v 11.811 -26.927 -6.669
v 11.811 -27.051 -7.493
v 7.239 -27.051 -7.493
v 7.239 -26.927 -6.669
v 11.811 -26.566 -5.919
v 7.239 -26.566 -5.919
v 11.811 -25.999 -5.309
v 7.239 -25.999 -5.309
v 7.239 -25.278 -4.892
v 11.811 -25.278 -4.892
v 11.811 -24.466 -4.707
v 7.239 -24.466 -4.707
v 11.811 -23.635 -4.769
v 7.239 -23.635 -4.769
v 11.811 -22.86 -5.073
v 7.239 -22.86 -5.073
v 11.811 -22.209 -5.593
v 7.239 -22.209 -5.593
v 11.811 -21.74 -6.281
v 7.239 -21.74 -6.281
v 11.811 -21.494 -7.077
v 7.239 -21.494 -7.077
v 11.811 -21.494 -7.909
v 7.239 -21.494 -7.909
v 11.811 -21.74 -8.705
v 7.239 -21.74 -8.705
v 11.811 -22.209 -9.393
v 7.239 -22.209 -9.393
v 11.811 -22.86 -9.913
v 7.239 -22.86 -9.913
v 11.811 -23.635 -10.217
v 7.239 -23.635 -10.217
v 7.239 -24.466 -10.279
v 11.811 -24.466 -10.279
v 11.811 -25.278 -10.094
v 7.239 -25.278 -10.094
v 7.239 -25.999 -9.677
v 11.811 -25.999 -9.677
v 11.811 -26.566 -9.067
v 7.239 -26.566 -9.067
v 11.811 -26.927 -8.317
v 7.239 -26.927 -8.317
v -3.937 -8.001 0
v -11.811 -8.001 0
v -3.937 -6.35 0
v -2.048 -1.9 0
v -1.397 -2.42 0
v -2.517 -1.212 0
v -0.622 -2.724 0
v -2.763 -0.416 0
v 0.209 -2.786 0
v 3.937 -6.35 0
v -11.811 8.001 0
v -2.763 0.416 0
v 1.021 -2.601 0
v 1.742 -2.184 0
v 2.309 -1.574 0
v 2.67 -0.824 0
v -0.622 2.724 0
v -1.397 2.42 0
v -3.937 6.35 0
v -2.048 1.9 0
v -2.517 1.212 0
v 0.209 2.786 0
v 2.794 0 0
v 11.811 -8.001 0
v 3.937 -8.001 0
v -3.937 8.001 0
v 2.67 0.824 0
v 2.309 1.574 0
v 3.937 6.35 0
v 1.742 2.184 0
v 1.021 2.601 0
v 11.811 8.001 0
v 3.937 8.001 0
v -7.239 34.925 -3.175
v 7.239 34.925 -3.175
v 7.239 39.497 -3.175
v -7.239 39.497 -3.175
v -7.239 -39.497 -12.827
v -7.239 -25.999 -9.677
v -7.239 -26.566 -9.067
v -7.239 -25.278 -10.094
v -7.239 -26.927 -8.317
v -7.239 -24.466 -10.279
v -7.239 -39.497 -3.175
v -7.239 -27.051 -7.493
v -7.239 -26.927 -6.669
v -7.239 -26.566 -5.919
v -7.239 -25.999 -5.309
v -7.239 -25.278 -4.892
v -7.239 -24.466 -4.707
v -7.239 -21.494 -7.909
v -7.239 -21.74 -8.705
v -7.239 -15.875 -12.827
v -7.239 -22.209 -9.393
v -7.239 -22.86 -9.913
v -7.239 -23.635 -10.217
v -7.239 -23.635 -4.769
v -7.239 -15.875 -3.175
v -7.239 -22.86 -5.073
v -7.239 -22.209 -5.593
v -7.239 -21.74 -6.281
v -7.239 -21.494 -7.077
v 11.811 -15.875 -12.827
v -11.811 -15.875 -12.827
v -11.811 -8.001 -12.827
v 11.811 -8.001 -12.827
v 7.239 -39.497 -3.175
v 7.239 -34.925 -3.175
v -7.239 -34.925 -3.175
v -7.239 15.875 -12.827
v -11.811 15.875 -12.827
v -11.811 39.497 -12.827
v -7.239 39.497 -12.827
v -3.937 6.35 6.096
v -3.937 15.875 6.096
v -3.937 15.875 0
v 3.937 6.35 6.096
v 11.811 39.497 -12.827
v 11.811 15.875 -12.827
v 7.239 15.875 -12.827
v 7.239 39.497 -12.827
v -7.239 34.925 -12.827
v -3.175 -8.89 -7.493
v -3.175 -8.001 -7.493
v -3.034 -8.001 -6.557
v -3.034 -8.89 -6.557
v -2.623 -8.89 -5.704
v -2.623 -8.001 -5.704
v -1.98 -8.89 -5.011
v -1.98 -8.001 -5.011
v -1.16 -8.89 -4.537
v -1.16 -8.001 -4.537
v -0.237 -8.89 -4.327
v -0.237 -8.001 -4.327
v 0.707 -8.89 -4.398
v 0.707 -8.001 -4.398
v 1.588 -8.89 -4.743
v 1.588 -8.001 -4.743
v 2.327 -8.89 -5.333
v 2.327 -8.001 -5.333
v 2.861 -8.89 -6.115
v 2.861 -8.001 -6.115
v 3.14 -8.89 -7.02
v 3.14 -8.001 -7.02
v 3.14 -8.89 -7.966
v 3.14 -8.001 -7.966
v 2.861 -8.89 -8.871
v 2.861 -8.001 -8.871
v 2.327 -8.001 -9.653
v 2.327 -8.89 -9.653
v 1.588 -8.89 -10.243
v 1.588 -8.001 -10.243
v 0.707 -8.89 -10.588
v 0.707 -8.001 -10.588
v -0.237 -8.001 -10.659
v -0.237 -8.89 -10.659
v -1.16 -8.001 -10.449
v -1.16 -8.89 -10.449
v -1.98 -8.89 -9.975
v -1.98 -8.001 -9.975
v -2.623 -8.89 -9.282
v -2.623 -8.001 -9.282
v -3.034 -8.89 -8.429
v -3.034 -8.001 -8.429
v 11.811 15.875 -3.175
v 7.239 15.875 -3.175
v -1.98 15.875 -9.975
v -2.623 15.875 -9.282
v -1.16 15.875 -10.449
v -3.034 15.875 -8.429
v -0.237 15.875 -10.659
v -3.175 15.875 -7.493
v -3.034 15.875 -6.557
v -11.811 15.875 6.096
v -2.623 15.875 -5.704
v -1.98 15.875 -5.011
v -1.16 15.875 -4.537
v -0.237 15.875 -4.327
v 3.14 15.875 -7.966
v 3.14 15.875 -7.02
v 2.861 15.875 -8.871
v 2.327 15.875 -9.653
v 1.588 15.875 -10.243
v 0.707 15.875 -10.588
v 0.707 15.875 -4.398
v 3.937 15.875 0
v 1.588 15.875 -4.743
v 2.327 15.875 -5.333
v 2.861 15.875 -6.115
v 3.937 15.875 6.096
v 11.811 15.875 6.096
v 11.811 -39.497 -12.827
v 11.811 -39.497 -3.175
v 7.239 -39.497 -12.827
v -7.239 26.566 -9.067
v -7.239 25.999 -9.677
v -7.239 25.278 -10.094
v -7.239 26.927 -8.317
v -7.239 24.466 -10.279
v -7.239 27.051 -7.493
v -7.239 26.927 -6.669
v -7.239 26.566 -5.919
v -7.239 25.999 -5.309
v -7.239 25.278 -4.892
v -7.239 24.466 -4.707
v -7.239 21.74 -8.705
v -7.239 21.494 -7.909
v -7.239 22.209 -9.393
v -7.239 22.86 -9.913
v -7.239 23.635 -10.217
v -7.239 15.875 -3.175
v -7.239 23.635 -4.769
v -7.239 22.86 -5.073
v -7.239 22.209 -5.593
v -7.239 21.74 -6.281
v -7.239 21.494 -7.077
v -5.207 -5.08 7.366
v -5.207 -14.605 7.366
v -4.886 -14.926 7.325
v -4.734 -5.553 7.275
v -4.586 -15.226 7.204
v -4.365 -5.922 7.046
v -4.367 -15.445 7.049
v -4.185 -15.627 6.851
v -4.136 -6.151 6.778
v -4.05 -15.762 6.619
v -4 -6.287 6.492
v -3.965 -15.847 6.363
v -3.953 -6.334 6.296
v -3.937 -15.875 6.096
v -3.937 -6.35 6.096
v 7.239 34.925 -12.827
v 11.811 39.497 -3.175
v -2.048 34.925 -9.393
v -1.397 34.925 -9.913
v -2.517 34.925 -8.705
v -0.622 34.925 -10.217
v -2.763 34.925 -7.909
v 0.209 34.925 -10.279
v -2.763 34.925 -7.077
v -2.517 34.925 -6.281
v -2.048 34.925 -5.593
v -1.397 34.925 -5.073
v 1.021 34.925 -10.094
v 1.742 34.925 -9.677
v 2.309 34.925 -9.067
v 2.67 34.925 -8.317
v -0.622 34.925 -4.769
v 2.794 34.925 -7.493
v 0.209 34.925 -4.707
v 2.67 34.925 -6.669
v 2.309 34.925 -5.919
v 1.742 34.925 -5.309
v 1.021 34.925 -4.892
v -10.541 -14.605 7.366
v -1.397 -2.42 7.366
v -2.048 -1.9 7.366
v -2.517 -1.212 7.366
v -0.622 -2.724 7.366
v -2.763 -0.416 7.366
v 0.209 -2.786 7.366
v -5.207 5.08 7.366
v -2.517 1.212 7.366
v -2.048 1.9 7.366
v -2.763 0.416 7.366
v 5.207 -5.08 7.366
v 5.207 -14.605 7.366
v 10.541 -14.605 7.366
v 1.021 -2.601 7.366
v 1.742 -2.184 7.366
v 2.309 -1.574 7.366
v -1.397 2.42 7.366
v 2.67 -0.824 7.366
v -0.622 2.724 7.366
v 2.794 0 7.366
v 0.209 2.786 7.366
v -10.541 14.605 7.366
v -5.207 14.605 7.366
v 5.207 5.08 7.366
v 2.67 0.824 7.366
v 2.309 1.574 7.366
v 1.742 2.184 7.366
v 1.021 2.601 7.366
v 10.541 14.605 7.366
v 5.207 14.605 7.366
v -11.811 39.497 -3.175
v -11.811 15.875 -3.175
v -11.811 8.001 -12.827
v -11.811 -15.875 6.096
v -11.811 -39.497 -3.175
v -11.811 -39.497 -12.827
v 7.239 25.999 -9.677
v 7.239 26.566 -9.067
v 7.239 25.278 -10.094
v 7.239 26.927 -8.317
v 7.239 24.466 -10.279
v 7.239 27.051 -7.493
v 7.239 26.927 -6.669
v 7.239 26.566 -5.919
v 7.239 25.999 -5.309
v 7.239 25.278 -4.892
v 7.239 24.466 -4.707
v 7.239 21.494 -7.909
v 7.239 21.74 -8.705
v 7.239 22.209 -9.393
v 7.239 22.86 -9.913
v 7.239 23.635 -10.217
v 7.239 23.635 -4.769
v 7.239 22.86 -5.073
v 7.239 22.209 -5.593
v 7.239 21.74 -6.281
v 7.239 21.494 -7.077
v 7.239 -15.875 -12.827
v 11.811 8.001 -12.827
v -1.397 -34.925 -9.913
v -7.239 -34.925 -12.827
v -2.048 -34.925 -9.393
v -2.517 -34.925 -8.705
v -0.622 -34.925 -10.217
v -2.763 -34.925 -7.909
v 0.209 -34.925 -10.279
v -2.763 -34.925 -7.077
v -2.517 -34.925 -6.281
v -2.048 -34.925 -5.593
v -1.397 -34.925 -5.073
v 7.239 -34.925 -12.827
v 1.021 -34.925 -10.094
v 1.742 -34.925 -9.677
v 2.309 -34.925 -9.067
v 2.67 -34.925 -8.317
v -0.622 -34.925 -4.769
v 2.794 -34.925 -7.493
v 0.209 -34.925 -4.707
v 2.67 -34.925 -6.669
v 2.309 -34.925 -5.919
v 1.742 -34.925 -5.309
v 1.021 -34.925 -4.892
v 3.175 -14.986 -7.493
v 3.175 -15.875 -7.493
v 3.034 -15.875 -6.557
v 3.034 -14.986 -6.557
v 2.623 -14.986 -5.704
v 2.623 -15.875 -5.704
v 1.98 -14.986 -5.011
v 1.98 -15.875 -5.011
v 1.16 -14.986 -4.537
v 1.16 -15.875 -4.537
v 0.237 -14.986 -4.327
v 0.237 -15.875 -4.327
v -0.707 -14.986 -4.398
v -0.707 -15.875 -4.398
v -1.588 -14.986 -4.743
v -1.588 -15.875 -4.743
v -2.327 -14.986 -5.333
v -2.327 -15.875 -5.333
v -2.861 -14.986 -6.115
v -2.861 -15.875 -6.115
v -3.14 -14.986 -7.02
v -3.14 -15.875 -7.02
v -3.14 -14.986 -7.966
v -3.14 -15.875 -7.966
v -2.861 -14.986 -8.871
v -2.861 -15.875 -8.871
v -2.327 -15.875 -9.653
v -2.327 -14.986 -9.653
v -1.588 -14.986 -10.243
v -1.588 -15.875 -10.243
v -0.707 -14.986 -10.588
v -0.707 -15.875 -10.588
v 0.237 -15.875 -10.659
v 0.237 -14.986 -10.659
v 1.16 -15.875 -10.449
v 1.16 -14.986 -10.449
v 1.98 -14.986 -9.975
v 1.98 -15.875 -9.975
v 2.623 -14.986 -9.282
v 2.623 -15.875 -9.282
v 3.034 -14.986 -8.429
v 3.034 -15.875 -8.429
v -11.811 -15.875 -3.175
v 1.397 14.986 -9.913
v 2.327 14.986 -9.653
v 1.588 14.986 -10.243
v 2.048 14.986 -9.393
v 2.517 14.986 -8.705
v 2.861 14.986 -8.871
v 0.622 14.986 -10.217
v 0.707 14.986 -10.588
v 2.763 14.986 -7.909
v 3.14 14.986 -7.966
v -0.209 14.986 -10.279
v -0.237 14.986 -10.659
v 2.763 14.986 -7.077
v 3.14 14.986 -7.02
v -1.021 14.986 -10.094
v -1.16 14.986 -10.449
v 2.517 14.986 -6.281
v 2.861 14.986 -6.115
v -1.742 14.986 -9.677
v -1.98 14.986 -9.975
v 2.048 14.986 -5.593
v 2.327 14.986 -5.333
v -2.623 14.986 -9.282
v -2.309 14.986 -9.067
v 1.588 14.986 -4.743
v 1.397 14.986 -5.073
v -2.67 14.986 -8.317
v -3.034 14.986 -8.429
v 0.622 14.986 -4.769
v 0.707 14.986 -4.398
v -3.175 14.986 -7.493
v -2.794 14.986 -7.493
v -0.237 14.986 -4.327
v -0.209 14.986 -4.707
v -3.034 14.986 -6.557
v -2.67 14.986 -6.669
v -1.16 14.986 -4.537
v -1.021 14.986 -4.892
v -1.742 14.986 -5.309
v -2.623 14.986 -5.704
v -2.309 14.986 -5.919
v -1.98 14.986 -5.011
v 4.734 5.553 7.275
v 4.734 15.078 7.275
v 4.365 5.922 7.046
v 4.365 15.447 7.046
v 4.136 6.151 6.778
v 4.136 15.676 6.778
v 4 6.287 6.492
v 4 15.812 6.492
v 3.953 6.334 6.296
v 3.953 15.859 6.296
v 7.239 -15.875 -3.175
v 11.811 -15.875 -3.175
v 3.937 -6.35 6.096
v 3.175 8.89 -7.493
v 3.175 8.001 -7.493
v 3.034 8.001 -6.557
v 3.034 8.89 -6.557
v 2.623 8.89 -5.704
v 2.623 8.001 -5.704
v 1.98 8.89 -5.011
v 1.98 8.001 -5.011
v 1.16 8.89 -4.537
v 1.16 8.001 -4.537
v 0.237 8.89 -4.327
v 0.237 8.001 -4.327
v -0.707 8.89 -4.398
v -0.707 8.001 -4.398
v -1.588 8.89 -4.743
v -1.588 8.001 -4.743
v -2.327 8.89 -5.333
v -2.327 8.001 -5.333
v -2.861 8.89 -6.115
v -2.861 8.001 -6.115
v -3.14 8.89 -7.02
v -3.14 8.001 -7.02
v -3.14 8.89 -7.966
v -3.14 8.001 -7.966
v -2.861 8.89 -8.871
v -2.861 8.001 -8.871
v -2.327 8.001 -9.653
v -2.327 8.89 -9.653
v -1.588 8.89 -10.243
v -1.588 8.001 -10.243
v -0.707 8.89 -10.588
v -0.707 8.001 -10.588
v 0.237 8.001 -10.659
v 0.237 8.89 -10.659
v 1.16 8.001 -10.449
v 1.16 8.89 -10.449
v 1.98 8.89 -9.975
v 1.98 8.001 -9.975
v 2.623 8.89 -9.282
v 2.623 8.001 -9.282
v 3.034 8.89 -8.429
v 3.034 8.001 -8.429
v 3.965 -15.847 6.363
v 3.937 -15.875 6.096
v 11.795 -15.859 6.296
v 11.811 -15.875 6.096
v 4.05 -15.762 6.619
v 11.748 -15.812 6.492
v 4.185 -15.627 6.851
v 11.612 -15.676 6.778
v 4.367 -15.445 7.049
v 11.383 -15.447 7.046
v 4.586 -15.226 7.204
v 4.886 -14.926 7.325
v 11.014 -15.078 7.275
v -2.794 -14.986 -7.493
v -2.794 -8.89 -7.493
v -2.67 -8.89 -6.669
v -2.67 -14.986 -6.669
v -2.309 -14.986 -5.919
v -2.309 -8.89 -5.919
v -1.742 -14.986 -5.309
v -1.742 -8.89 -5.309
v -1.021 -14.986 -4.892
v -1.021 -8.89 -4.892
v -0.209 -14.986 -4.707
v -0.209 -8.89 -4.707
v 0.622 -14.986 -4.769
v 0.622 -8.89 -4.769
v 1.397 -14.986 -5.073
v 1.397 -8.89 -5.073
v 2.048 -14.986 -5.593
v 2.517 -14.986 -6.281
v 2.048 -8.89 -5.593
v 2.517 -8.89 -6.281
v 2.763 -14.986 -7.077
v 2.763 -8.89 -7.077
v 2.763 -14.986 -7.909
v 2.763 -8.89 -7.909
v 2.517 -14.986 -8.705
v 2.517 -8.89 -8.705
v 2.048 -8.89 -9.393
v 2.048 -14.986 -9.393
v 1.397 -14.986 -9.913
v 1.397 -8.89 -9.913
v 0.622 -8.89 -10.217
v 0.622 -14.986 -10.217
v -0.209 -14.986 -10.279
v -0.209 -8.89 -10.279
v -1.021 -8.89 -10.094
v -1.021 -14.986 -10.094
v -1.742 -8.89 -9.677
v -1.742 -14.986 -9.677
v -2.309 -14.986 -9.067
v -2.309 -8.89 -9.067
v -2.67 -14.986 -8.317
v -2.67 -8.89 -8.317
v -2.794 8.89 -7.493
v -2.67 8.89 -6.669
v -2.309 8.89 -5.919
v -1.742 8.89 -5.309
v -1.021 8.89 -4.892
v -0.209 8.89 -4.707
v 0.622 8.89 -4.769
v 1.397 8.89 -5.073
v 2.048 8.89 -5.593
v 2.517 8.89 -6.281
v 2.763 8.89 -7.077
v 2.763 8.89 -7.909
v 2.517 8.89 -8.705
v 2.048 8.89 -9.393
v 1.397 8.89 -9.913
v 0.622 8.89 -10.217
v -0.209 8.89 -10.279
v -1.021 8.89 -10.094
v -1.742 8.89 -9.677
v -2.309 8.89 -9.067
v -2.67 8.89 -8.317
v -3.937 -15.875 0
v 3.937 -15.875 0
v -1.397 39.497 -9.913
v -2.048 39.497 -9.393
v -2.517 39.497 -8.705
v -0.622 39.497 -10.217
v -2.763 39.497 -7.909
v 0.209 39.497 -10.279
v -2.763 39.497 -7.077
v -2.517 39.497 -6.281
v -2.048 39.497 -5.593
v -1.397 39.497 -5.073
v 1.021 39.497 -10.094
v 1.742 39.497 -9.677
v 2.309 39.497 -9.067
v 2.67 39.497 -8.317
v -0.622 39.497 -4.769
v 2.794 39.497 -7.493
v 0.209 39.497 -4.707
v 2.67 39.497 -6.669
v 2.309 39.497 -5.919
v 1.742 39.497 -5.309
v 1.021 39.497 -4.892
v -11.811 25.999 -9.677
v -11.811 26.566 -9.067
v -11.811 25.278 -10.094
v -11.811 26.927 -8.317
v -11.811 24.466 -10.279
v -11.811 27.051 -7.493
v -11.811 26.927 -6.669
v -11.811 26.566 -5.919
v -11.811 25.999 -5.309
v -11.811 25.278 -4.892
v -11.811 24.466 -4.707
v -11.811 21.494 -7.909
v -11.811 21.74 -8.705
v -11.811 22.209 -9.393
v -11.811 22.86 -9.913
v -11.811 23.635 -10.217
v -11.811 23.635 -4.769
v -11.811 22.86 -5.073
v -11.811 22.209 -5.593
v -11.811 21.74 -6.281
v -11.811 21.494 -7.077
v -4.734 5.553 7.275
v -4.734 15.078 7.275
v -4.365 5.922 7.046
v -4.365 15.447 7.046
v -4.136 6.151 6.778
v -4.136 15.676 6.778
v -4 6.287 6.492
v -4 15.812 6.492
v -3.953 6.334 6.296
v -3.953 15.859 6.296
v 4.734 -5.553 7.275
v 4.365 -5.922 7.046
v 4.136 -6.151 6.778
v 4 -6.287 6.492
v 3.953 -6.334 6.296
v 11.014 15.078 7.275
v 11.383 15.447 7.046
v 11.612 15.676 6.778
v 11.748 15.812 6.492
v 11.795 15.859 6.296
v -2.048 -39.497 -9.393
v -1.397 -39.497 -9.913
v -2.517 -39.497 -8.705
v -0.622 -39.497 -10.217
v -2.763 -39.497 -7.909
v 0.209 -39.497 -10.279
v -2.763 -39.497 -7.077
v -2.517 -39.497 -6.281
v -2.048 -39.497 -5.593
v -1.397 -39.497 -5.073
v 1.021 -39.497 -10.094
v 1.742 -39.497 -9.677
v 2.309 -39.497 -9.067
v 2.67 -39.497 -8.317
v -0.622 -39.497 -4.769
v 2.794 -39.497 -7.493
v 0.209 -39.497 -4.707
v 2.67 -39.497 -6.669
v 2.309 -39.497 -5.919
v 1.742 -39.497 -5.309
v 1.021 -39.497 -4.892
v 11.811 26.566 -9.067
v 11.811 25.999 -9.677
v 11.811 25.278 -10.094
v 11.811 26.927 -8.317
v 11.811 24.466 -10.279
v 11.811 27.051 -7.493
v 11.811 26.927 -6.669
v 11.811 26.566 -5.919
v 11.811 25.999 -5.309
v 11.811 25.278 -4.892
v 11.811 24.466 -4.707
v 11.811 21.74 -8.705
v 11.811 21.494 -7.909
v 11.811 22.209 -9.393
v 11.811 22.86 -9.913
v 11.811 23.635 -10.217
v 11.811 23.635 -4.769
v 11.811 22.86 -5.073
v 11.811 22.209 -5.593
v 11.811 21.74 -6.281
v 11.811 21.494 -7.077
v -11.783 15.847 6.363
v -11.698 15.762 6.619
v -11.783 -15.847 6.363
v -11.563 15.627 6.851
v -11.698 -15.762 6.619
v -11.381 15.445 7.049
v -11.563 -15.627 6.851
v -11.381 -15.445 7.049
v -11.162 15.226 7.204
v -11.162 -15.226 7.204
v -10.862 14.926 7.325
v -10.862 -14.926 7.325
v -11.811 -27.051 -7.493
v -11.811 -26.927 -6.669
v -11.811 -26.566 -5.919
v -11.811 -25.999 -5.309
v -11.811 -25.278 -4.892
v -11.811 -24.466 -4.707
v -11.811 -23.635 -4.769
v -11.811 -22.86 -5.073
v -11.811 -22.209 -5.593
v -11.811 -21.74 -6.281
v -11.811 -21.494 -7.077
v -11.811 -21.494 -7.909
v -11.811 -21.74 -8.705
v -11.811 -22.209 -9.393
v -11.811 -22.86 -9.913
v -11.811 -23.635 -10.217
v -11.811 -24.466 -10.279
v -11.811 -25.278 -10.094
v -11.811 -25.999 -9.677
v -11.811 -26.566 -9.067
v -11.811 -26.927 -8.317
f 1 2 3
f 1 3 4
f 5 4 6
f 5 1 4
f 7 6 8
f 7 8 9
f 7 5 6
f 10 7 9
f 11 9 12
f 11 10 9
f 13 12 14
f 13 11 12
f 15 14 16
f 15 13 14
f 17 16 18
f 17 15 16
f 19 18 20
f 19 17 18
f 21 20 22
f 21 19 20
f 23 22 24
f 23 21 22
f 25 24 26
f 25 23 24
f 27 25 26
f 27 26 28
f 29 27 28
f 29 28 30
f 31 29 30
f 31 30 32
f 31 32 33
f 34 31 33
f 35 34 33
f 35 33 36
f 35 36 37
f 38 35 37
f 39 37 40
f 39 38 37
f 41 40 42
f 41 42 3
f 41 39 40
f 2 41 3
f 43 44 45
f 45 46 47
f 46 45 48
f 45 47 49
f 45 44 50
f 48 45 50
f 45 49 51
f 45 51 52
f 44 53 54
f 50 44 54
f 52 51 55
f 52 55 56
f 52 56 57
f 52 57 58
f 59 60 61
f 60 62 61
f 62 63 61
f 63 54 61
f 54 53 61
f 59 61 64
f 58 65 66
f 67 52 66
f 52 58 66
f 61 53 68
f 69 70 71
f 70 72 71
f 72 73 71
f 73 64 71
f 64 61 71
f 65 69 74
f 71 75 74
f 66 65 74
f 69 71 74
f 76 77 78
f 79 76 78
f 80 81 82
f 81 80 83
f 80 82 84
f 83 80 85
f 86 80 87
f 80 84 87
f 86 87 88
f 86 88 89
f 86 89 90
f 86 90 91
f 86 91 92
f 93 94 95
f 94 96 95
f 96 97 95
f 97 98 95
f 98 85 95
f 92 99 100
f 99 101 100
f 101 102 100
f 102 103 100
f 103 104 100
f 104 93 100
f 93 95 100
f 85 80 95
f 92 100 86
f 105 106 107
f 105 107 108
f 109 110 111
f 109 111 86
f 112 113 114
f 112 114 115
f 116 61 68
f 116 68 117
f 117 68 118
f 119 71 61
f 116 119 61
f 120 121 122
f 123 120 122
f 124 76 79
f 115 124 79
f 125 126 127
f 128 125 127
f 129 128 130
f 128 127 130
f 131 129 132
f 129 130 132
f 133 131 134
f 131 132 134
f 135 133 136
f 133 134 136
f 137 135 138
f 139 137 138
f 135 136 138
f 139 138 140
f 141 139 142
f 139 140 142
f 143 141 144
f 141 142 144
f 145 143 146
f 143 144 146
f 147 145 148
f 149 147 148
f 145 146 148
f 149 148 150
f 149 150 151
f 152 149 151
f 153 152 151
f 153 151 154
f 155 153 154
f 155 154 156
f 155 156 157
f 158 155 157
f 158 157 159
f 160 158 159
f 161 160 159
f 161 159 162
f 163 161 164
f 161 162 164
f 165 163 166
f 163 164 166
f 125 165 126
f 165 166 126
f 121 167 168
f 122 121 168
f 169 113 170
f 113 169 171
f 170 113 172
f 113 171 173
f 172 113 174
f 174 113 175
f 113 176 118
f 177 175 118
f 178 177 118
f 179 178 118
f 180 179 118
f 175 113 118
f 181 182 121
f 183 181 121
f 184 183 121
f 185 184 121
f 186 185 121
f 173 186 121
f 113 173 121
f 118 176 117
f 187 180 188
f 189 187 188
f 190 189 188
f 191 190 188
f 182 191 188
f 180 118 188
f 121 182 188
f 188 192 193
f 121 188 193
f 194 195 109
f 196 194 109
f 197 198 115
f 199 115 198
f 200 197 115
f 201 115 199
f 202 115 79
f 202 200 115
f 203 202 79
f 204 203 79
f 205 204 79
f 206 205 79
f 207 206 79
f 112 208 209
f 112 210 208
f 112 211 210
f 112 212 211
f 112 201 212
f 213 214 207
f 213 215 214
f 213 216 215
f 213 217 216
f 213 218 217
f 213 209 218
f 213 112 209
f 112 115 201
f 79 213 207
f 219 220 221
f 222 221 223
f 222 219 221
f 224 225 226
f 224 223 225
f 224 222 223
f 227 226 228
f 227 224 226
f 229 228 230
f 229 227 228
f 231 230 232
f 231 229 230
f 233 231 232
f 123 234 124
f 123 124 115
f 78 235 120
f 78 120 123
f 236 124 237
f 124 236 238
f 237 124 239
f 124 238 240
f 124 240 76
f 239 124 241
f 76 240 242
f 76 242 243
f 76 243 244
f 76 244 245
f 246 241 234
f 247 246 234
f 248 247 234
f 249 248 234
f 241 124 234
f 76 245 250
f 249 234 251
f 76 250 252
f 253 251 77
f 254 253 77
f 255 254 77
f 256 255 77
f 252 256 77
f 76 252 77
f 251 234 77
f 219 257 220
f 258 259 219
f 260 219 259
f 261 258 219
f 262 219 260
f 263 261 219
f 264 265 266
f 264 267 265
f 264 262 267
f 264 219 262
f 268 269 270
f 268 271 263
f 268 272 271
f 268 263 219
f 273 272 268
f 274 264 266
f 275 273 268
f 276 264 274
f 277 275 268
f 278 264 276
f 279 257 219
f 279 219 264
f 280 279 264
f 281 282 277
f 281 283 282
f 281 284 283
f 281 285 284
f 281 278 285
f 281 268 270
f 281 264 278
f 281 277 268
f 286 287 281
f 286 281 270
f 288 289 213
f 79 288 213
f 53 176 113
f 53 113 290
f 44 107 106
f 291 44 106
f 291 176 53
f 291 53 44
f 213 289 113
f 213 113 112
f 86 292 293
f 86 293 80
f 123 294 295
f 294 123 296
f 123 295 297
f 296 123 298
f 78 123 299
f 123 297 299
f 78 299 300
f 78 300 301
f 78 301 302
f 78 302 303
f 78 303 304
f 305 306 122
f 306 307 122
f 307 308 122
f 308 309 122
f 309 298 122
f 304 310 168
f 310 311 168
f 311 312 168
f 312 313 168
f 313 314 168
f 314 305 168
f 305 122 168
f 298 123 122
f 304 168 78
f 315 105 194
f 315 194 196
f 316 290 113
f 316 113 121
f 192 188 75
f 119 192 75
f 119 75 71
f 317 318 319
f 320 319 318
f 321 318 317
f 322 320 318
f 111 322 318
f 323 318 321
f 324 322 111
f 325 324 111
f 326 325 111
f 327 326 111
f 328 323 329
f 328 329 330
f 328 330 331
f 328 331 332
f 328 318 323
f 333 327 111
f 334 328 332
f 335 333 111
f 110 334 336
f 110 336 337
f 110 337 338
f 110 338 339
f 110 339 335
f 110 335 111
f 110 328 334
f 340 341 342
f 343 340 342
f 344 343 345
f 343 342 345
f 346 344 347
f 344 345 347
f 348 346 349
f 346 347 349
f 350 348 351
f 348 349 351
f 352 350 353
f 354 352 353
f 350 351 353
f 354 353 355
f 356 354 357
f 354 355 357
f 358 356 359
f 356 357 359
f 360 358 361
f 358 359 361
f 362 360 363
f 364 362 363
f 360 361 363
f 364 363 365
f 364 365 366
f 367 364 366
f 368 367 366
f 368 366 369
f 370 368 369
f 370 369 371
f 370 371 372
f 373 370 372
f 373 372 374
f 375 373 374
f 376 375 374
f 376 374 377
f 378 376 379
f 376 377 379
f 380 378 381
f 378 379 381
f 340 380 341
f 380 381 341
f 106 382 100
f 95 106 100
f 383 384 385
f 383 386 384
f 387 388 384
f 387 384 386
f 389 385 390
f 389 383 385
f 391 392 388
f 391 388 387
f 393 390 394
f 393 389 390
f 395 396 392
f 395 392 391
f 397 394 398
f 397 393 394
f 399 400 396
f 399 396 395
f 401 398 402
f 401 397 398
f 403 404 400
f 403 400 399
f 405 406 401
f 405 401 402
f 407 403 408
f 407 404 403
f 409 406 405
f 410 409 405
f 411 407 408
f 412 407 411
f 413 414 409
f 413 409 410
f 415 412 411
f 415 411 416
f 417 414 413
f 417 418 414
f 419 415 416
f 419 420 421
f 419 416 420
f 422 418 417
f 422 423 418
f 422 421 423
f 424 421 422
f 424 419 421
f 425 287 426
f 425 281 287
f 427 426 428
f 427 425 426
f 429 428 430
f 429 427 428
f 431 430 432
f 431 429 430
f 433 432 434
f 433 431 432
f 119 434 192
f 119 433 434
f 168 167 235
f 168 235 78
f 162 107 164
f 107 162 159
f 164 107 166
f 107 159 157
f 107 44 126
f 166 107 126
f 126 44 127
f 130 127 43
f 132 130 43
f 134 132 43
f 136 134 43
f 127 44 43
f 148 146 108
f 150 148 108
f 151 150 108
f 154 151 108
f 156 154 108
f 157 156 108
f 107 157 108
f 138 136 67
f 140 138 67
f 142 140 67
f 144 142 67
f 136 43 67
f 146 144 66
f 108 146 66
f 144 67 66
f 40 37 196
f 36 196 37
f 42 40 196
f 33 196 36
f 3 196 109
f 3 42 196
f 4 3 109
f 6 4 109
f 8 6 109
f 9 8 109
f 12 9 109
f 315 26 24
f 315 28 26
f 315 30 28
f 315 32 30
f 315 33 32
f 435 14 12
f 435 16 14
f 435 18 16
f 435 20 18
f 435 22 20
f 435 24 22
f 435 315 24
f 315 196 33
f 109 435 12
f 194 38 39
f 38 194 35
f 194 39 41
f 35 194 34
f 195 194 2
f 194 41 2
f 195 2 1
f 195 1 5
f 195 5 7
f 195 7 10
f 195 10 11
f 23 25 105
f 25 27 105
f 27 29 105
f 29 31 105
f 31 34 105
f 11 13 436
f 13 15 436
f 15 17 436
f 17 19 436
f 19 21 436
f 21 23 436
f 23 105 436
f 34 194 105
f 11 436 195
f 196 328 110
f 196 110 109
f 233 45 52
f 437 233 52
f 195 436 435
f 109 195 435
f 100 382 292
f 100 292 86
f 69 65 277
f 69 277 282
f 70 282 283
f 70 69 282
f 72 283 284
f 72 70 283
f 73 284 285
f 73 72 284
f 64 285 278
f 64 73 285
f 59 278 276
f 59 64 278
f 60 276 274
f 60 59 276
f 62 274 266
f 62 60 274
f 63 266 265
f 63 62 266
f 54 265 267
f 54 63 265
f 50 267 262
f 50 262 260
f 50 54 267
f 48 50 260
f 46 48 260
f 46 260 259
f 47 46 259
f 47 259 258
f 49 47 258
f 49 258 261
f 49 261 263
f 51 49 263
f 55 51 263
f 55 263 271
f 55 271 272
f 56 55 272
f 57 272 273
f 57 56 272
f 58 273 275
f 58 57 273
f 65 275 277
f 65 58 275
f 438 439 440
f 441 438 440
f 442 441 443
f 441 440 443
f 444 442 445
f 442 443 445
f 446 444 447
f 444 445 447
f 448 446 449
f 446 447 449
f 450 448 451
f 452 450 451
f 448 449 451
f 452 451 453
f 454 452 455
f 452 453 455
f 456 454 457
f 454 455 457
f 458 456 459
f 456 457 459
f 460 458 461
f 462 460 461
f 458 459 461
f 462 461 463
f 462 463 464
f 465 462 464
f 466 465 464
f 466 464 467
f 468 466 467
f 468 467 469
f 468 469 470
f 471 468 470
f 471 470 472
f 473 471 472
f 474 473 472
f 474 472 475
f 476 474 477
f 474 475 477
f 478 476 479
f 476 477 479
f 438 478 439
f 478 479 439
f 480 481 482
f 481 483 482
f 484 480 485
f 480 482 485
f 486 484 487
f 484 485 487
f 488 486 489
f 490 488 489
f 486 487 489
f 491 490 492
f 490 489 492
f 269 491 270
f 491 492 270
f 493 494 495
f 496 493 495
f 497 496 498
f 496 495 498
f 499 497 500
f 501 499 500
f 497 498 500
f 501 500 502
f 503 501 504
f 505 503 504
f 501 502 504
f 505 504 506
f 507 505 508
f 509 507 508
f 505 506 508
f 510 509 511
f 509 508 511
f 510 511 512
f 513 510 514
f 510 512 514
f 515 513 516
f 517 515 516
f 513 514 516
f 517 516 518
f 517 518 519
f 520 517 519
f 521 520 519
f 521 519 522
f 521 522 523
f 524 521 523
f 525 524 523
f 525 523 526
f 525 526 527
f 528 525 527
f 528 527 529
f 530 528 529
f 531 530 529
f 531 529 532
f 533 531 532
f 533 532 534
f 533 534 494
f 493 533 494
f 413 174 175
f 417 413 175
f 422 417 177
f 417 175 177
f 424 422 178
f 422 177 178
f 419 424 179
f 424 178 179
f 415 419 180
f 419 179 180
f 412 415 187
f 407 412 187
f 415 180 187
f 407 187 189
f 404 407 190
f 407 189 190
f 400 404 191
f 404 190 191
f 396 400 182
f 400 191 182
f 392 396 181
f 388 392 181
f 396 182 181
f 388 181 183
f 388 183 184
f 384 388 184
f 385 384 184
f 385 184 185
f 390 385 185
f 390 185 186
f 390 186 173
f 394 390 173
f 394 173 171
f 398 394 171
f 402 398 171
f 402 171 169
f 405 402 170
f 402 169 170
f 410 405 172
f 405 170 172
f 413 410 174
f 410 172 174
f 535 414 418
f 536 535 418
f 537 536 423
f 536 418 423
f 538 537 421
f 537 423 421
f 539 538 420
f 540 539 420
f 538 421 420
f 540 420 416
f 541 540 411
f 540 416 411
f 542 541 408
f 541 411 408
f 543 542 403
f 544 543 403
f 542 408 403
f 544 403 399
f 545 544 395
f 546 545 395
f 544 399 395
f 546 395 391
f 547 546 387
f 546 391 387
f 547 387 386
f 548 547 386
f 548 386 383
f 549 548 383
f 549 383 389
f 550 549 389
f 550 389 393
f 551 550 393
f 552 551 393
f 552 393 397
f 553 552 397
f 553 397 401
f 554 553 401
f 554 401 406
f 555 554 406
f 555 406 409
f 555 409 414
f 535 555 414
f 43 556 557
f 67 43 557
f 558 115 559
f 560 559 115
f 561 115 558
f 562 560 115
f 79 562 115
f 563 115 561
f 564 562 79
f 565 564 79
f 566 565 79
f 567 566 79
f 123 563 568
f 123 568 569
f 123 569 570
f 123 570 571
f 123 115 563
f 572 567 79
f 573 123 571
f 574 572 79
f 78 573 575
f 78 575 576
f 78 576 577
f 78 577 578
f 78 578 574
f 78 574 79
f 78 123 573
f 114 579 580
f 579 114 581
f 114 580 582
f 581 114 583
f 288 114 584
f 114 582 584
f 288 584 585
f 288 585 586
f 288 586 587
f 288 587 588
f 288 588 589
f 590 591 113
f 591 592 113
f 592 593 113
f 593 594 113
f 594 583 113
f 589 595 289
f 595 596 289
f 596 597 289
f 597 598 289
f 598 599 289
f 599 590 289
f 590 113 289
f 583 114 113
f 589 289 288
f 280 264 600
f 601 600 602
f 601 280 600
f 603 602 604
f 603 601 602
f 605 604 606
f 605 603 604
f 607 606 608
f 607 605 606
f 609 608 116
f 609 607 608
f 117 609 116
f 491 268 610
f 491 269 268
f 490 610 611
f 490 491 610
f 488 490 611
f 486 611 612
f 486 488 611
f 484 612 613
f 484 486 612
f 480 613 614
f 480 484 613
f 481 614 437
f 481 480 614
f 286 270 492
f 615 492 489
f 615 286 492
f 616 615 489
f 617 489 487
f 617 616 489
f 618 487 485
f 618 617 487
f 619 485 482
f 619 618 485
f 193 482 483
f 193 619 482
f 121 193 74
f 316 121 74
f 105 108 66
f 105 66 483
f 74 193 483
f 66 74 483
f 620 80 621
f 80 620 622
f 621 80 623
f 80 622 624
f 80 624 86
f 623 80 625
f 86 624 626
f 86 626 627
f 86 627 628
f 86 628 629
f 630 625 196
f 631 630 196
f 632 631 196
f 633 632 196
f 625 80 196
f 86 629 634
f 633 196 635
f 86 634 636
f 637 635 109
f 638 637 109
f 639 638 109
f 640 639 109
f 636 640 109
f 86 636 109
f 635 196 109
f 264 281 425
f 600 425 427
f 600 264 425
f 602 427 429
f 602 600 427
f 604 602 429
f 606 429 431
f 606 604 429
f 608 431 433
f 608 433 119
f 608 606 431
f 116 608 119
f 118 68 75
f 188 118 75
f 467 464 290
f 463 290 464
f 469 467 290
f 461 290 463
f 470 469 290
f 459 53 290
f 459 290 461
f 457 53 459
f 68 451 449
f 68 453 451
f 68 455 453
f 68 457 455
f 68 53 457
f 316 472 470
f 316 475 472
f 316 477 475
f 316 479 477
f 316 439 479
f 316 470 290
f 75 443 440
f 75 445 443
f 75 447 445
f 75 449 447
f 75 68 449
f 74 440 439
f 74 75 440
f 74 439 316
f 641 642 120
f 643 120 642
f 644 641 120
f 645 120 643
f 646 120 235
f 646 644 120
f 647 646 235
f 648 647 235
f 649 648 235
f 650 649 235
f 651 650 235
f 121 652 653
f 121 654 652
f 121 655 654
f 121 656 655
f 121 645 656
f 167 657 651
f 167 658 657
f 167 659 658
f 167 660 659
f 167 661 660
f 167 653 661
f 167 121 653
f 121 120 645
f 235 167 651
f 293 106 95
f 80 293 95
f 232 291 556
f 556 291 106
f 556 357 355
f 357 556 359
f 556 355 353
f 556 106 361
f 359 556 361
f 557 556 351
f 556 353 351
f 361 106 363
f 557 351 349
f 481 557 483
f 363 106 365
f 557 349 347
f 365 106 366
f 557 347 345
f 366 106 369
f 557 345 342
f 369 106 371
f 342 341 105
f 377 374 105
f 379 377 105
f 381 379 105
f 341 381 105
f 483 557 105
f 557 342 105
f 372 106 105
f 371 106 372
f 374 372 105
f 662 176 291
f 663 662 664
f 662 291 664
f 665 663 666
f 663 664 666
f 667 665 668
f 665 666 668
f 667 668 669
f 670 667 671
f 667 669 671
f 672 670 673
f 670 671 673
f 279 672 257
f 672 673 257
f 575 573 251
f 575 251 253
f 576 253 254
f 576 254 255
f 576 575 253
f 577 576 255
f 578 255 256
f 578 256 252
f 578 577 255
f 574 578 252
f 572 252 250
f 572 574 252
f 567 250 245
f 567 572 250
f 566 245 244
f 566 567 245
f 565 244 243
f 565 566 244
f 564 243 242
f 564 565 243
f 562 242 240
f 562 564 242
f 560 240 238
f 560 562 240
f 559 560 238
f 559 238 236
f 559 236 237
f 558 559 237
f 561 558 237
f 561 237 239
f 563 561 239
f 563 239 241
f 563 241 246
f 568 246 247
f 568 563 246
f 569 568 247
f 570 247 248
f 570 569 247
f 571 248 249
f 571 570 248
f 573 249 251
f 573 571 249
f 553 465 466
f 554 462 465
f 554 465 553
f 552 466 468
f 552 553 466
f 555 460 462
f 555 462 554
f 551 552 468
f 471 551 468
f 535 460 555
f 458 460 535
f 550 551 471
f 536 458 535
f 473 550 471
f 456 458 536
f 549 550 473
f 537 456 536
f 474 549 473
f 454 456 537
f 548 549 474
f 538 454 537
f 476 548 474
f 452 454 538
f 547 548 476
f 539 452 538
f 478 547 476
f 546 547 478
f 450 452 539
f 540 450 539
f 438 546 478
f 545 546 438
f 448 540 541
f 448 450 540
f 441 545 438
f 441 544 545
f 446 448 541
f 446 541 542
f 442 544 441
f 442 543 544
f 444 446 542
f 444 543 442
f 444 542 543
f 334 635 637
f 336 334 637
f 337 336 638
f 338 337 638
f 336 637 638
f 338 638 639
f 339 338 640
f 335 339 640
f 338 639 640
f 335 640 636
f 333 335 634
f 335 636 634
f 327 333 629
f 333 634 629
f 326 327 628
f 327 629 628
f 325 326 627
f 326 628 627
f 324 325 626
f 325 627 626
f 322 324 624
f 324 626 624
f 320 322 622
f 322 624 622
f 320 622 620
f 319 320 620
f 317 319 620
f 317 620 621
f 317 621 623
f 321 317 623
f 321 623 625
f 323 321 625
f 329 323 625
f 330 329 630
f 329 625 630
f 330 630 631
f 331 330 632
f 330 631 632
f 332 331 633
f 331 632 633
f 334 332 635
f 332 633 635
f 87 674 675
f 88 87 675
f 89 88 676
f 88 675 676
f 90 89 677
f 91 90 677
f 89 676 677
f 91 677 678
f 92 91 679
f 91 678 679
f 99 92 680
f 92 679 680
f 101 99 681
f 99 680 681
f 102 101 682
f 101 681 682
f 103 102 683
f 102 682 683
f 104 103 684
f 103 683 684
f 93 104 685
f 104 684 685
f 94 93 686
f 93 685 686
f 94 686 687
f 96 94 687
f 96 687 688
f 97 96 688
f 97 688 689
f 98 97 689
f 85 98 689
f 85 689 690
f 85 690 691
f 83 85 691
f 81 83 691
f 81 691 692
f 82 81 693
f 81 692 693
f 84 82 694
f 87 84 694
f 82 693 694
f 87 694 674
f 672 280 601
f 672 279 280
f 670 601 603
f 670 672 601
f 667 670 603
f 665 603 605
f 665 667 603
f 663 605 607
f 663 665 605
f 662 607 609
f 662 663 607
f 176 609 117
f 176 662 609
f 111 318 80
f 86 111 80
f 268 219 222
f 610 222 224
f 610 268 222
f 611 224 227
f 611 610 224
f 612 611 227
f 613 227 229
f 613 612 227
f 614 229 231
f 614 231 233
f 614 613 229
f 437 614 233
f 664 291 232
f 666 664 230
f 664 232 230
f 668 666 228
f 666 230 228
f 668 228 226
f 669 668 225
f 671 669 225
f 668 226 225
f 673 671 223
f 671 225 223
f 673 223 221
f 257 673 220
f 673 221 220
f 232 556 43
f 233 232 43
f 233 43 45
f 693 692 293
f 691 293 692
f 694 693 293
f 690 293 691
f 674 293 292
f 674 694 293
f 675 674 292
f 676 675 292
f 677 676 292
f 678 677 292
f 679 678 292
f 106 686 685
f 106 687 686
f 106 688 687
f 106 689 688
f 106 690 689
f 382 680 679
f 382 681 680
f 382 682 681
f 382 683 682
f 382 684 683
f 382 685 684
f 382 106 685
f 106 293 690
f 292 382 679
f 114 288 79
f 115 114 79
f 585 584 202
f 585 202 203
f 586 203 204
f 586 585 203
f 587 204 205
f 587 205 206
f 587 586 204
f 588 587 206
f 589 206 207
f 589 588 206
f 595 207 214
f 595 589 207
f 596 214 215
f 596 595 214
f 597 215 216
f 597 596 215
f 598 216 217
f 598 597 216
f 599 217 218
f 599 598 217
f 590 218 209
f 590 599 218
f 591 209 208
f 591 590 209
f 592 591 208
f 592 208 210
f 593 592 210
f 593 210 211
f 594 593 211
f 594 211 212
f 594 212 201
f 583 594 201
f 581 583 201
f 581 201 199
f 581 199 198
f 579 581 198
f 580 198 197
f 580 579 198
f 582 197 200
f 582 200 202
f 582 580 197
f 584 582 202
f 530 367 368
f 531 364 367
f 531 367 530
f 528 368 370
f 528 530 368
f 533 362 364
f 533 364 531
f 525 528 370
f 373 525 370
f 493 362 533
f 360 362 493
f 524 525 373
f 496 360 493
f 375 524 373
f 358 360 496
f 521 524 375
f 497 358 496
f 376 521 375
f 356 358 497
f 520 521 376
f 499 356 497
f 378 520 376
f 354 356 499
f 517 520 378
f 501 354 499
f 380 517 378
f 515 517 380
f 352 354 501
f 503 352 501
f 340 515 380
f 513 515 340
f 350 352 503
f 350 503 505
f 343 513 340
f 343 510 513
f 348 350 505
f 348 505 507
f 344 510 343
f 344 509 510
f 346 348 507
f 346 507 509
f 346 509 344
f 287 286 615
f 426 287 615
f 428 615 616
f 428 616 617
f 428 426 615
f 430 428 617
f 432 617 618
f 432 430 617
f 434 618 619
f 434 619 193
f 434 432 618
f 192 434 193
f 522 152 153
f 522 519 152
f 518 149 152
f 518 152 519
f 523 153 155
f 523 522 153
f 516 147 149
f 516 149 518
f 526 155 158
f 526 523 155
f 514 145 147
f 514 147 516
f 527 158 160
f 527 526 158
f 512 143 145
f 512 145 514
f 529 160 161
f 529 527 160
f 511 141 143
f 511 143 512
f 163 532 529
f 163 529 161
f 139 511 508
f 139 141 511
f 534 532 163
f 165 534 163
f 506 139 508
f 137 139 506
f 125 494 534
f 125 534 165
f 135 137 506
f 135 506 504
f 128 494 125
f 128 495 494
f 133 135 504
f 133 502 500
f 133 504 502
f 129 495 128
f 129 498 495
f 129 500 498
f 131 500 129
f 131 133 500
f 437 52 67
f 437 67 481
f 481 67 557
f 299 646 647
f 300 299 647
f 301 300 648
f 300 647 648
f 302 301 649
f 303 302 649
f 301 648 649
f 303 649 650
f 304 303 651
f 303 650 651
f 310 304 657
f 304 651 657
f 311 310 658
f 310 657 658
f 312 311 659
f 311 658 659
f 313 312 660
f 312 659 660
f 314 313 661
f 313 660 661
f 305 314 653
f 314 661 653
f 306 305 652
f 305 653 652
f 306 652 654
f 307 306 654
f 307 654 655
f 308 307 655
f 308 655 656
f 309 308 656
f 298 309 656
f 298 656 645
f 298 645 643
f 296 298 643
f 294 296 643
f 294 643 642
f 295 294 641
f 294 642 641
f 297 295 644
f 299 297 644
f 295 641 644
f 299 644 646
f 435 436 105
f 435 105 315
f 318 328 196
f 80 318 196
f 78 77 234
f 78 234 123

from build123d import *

# Parameters (mm, degrees)
F0_R      = 2.794
F1_DEPTH  = 7.366
F2_W      = 23.622
F2_H      = 7.874
F3_DEPTH  = 12.827
F4_R      = 2.794
F5_DEPTH  = 31.75
F6_W      = 4.572
F6_H      = 9.652
F7_DEPTH  = 23.622
F8_R      = 2.794
F9_DEPTH  = 4.572
F11_W     = 4.572
F11_H     = 9.652
F12_DEPTH = 14.478
F13_R     = 2.794
F14_DEPTH = 4.572
F16_R     = 1.27
F17_R     = 3.175
F18_DEPTH = 0.889
F19_R     = 3.175
F19_R_2   = 2.794
F20_DEPTH = 0.889
F21_R     = 3.175
F21_R_2   = 2.794
F22_DEPTH = 0.889
F23_R     = 3.175
F23_R_2   = 2.794
F24_DEPTH = 0.889


with BuildPart() as f1:
    # F0 (on Top) → F1 (new body)
    with BuildSketch(Plane.XY):
        Polygon((-3.937, 15.875), (-11.811, 15.875), (-11.811, 0), (-11.811, -15.875), (-3.937, -15.875), (-3.937, -6.35), (0, -6.35), (3.937, -6.35), (3.937, -15.875), (11.811, -15.875), (11.811, 0), (11.811, 15.875), (3.937, 15.875), (3.937, 6.35), (0, 6.35), (-3.937, 6.35), align=None)
        Circle(F0_R, mode=Mode.SUBTRACT)
    extrude(amount=F1_DEPTH)

    # F2 (on face) → F3 (join)
    with BuildSketch(Plane(origin=(0, 0, 0), x_dir=(1, 0, 0), z_dir=(0, 0, -1))):
        with Locations((0, -11.938)):
            Rectangle(F2_W, F2_H)
        with Locations((0, 11.938)):
            Rectangle(F2_W, F2_H)
    extrude(amount=F3_DEPTH)

    # F4 (on face) → F5 (cut, through all)
    with BuildSketch(Plane(origin=(0, 15.875, 0), x_dir=(-1, 0, 0), z_dir=(0, 1, 0))):
        with Locations((0, -7.493)):
            Circle(F4_R)
    extrude(amount=-F5_DEPTH, mode=Mode.SUBTRACT)

    # F16
    f16_edges = [f1.edges().sort_by_distance(p)[0] for p in [
        (-11.811, 0, 7.366),
        (-7.874, 15.875, 7.366),
        (-3.937, 11.1125, 7.366),
        (0, 6.35, 7.366),
        (3.937, 11.1125, 7.366),
        (7.874, 15.875, 7.366),
        (11.811, 0, 7.366),
        (7.874, -15.875, 7.366),
        (3.937, -11.1125, 7.366),
        (0, -6.35, 7.366),
        (-7.874, -15.875, 7.366),
        (-3.937, -11.1125, 7.366),
    ]]
    fillet(f16_edges, radius=F16_R)

    # F17 (on face) → F18 (cut)
    with BuildSketch(Plane.XZ.offset(-8.001)):
        with Locations((0, -7.493)):
            Circle(F17_R)
    extrude(amount=-F18_DEPTH, mode=Mode.SUBTRACT)

    # F19 (on face) → F20 (cut)
    with BuildSketch(Plane(origin=(0, -8.001, 0), x_dir=(-1, 0, 0), z_dir=(0, 1, 0))):
        with Locations((0, -7.493)):
            Circle(F19_R)
        with Locations((0, -7.493)):
            Circle(F19_R_2, mode=Mode.SUBTRACT)
    extrude(amount=-F20_DEPTH, mode=Mode.SUBTRACT)

    # F21 (on face) → F22 (cut)
    with BuildSketch(Plane.XZ.offset(15.875)):
        with Locations((0, -7.493)):
            Circle(F21_R)
        with Locations((0, -7.493)):
            Circle(F21_R_2, mode=Mode.SUBTRACT)
    extrude(amount=-F22_DEPTH, mode=Mode.SUBTRACT)

    # F23 (on face) → F24 (cut)
    with BuildSketch(Plane(origin=(0, 15.875, 0), x_dir=(-1, 0, 0), z_dir=(0, 1, 0))):
        with Locations((0, -7.493)):
            Circle(F23_R)
        with Locations((0, -7.493)):
            Circle(F23_R_2, mode=Mode.SUBTRACT)
    extrude(amount=-F24_DEPTH, mode=Mode.SUBTRACT)


with BuildPart() as f7:
    # F6 (on face) → F7 (new body)
    with BuildSketch(Plane.XZ.offset(15.875)):
        with Locations((-9.525, -8.001)):
            Rectangle(F6_W, F6_H)
    extrude(amount=F7_DEPTH)

    # F8 (on face) → F9 (cut, through all)
    with BuildSketch(Plane(origin=(-11.811, 0, 0), x_dir=(0, -1, 0), z_dir=(-1, 0, 0))):
        with Locations((24.257, -7.493)):
            Circle(F8_R)
    extrude(amount=-F9_DEPTH, mode=Mode.SUBTRACT)


with BuildPart() as f10_1:
    # F10: instance of F7
    add(f7.part.mirror(Plane.YZ))


with BuildPart() as f12:
    # F11 (on face) → F12 (new body, through all)
    with BuildSketch(Plane(origin=(7.239, 0, 0), x_dir=(0, -1, 0), z_dir=(-1, 0, 0))):
        with Locations((37.211, -8.001)):
            Rectangle(F11_W, F11_H)
    extrude(amount=F12_DEPTH)

    # F13 (on face) → F14 (cut, through all)
    with BuildSketch(Plane.XZ.offset(39.497)):
        with Locations((0, -7.493)):
            Circle(F13_R)
    extrude(amount=-F14_DEPTH, mode=Mode.SUBTRACT)


with BuildPart() as f15_1:
    # F15: instance of F7
    add(f7.part.mirror(Plane.XZ))


with BuildPart() as f15_2:
    # F15: instance of F12
    add(f12.part.mirror(Plane.XZ))


with BuildPart() as f15_3:
    # F15: instance of F10_1
    add(f10_1.part.mirror(Plane.XZ))


solid = Compound([f1.part, f7.part, f10_1.part, f12.part, f15_1.part, f15_2.part, f15_3.part])
